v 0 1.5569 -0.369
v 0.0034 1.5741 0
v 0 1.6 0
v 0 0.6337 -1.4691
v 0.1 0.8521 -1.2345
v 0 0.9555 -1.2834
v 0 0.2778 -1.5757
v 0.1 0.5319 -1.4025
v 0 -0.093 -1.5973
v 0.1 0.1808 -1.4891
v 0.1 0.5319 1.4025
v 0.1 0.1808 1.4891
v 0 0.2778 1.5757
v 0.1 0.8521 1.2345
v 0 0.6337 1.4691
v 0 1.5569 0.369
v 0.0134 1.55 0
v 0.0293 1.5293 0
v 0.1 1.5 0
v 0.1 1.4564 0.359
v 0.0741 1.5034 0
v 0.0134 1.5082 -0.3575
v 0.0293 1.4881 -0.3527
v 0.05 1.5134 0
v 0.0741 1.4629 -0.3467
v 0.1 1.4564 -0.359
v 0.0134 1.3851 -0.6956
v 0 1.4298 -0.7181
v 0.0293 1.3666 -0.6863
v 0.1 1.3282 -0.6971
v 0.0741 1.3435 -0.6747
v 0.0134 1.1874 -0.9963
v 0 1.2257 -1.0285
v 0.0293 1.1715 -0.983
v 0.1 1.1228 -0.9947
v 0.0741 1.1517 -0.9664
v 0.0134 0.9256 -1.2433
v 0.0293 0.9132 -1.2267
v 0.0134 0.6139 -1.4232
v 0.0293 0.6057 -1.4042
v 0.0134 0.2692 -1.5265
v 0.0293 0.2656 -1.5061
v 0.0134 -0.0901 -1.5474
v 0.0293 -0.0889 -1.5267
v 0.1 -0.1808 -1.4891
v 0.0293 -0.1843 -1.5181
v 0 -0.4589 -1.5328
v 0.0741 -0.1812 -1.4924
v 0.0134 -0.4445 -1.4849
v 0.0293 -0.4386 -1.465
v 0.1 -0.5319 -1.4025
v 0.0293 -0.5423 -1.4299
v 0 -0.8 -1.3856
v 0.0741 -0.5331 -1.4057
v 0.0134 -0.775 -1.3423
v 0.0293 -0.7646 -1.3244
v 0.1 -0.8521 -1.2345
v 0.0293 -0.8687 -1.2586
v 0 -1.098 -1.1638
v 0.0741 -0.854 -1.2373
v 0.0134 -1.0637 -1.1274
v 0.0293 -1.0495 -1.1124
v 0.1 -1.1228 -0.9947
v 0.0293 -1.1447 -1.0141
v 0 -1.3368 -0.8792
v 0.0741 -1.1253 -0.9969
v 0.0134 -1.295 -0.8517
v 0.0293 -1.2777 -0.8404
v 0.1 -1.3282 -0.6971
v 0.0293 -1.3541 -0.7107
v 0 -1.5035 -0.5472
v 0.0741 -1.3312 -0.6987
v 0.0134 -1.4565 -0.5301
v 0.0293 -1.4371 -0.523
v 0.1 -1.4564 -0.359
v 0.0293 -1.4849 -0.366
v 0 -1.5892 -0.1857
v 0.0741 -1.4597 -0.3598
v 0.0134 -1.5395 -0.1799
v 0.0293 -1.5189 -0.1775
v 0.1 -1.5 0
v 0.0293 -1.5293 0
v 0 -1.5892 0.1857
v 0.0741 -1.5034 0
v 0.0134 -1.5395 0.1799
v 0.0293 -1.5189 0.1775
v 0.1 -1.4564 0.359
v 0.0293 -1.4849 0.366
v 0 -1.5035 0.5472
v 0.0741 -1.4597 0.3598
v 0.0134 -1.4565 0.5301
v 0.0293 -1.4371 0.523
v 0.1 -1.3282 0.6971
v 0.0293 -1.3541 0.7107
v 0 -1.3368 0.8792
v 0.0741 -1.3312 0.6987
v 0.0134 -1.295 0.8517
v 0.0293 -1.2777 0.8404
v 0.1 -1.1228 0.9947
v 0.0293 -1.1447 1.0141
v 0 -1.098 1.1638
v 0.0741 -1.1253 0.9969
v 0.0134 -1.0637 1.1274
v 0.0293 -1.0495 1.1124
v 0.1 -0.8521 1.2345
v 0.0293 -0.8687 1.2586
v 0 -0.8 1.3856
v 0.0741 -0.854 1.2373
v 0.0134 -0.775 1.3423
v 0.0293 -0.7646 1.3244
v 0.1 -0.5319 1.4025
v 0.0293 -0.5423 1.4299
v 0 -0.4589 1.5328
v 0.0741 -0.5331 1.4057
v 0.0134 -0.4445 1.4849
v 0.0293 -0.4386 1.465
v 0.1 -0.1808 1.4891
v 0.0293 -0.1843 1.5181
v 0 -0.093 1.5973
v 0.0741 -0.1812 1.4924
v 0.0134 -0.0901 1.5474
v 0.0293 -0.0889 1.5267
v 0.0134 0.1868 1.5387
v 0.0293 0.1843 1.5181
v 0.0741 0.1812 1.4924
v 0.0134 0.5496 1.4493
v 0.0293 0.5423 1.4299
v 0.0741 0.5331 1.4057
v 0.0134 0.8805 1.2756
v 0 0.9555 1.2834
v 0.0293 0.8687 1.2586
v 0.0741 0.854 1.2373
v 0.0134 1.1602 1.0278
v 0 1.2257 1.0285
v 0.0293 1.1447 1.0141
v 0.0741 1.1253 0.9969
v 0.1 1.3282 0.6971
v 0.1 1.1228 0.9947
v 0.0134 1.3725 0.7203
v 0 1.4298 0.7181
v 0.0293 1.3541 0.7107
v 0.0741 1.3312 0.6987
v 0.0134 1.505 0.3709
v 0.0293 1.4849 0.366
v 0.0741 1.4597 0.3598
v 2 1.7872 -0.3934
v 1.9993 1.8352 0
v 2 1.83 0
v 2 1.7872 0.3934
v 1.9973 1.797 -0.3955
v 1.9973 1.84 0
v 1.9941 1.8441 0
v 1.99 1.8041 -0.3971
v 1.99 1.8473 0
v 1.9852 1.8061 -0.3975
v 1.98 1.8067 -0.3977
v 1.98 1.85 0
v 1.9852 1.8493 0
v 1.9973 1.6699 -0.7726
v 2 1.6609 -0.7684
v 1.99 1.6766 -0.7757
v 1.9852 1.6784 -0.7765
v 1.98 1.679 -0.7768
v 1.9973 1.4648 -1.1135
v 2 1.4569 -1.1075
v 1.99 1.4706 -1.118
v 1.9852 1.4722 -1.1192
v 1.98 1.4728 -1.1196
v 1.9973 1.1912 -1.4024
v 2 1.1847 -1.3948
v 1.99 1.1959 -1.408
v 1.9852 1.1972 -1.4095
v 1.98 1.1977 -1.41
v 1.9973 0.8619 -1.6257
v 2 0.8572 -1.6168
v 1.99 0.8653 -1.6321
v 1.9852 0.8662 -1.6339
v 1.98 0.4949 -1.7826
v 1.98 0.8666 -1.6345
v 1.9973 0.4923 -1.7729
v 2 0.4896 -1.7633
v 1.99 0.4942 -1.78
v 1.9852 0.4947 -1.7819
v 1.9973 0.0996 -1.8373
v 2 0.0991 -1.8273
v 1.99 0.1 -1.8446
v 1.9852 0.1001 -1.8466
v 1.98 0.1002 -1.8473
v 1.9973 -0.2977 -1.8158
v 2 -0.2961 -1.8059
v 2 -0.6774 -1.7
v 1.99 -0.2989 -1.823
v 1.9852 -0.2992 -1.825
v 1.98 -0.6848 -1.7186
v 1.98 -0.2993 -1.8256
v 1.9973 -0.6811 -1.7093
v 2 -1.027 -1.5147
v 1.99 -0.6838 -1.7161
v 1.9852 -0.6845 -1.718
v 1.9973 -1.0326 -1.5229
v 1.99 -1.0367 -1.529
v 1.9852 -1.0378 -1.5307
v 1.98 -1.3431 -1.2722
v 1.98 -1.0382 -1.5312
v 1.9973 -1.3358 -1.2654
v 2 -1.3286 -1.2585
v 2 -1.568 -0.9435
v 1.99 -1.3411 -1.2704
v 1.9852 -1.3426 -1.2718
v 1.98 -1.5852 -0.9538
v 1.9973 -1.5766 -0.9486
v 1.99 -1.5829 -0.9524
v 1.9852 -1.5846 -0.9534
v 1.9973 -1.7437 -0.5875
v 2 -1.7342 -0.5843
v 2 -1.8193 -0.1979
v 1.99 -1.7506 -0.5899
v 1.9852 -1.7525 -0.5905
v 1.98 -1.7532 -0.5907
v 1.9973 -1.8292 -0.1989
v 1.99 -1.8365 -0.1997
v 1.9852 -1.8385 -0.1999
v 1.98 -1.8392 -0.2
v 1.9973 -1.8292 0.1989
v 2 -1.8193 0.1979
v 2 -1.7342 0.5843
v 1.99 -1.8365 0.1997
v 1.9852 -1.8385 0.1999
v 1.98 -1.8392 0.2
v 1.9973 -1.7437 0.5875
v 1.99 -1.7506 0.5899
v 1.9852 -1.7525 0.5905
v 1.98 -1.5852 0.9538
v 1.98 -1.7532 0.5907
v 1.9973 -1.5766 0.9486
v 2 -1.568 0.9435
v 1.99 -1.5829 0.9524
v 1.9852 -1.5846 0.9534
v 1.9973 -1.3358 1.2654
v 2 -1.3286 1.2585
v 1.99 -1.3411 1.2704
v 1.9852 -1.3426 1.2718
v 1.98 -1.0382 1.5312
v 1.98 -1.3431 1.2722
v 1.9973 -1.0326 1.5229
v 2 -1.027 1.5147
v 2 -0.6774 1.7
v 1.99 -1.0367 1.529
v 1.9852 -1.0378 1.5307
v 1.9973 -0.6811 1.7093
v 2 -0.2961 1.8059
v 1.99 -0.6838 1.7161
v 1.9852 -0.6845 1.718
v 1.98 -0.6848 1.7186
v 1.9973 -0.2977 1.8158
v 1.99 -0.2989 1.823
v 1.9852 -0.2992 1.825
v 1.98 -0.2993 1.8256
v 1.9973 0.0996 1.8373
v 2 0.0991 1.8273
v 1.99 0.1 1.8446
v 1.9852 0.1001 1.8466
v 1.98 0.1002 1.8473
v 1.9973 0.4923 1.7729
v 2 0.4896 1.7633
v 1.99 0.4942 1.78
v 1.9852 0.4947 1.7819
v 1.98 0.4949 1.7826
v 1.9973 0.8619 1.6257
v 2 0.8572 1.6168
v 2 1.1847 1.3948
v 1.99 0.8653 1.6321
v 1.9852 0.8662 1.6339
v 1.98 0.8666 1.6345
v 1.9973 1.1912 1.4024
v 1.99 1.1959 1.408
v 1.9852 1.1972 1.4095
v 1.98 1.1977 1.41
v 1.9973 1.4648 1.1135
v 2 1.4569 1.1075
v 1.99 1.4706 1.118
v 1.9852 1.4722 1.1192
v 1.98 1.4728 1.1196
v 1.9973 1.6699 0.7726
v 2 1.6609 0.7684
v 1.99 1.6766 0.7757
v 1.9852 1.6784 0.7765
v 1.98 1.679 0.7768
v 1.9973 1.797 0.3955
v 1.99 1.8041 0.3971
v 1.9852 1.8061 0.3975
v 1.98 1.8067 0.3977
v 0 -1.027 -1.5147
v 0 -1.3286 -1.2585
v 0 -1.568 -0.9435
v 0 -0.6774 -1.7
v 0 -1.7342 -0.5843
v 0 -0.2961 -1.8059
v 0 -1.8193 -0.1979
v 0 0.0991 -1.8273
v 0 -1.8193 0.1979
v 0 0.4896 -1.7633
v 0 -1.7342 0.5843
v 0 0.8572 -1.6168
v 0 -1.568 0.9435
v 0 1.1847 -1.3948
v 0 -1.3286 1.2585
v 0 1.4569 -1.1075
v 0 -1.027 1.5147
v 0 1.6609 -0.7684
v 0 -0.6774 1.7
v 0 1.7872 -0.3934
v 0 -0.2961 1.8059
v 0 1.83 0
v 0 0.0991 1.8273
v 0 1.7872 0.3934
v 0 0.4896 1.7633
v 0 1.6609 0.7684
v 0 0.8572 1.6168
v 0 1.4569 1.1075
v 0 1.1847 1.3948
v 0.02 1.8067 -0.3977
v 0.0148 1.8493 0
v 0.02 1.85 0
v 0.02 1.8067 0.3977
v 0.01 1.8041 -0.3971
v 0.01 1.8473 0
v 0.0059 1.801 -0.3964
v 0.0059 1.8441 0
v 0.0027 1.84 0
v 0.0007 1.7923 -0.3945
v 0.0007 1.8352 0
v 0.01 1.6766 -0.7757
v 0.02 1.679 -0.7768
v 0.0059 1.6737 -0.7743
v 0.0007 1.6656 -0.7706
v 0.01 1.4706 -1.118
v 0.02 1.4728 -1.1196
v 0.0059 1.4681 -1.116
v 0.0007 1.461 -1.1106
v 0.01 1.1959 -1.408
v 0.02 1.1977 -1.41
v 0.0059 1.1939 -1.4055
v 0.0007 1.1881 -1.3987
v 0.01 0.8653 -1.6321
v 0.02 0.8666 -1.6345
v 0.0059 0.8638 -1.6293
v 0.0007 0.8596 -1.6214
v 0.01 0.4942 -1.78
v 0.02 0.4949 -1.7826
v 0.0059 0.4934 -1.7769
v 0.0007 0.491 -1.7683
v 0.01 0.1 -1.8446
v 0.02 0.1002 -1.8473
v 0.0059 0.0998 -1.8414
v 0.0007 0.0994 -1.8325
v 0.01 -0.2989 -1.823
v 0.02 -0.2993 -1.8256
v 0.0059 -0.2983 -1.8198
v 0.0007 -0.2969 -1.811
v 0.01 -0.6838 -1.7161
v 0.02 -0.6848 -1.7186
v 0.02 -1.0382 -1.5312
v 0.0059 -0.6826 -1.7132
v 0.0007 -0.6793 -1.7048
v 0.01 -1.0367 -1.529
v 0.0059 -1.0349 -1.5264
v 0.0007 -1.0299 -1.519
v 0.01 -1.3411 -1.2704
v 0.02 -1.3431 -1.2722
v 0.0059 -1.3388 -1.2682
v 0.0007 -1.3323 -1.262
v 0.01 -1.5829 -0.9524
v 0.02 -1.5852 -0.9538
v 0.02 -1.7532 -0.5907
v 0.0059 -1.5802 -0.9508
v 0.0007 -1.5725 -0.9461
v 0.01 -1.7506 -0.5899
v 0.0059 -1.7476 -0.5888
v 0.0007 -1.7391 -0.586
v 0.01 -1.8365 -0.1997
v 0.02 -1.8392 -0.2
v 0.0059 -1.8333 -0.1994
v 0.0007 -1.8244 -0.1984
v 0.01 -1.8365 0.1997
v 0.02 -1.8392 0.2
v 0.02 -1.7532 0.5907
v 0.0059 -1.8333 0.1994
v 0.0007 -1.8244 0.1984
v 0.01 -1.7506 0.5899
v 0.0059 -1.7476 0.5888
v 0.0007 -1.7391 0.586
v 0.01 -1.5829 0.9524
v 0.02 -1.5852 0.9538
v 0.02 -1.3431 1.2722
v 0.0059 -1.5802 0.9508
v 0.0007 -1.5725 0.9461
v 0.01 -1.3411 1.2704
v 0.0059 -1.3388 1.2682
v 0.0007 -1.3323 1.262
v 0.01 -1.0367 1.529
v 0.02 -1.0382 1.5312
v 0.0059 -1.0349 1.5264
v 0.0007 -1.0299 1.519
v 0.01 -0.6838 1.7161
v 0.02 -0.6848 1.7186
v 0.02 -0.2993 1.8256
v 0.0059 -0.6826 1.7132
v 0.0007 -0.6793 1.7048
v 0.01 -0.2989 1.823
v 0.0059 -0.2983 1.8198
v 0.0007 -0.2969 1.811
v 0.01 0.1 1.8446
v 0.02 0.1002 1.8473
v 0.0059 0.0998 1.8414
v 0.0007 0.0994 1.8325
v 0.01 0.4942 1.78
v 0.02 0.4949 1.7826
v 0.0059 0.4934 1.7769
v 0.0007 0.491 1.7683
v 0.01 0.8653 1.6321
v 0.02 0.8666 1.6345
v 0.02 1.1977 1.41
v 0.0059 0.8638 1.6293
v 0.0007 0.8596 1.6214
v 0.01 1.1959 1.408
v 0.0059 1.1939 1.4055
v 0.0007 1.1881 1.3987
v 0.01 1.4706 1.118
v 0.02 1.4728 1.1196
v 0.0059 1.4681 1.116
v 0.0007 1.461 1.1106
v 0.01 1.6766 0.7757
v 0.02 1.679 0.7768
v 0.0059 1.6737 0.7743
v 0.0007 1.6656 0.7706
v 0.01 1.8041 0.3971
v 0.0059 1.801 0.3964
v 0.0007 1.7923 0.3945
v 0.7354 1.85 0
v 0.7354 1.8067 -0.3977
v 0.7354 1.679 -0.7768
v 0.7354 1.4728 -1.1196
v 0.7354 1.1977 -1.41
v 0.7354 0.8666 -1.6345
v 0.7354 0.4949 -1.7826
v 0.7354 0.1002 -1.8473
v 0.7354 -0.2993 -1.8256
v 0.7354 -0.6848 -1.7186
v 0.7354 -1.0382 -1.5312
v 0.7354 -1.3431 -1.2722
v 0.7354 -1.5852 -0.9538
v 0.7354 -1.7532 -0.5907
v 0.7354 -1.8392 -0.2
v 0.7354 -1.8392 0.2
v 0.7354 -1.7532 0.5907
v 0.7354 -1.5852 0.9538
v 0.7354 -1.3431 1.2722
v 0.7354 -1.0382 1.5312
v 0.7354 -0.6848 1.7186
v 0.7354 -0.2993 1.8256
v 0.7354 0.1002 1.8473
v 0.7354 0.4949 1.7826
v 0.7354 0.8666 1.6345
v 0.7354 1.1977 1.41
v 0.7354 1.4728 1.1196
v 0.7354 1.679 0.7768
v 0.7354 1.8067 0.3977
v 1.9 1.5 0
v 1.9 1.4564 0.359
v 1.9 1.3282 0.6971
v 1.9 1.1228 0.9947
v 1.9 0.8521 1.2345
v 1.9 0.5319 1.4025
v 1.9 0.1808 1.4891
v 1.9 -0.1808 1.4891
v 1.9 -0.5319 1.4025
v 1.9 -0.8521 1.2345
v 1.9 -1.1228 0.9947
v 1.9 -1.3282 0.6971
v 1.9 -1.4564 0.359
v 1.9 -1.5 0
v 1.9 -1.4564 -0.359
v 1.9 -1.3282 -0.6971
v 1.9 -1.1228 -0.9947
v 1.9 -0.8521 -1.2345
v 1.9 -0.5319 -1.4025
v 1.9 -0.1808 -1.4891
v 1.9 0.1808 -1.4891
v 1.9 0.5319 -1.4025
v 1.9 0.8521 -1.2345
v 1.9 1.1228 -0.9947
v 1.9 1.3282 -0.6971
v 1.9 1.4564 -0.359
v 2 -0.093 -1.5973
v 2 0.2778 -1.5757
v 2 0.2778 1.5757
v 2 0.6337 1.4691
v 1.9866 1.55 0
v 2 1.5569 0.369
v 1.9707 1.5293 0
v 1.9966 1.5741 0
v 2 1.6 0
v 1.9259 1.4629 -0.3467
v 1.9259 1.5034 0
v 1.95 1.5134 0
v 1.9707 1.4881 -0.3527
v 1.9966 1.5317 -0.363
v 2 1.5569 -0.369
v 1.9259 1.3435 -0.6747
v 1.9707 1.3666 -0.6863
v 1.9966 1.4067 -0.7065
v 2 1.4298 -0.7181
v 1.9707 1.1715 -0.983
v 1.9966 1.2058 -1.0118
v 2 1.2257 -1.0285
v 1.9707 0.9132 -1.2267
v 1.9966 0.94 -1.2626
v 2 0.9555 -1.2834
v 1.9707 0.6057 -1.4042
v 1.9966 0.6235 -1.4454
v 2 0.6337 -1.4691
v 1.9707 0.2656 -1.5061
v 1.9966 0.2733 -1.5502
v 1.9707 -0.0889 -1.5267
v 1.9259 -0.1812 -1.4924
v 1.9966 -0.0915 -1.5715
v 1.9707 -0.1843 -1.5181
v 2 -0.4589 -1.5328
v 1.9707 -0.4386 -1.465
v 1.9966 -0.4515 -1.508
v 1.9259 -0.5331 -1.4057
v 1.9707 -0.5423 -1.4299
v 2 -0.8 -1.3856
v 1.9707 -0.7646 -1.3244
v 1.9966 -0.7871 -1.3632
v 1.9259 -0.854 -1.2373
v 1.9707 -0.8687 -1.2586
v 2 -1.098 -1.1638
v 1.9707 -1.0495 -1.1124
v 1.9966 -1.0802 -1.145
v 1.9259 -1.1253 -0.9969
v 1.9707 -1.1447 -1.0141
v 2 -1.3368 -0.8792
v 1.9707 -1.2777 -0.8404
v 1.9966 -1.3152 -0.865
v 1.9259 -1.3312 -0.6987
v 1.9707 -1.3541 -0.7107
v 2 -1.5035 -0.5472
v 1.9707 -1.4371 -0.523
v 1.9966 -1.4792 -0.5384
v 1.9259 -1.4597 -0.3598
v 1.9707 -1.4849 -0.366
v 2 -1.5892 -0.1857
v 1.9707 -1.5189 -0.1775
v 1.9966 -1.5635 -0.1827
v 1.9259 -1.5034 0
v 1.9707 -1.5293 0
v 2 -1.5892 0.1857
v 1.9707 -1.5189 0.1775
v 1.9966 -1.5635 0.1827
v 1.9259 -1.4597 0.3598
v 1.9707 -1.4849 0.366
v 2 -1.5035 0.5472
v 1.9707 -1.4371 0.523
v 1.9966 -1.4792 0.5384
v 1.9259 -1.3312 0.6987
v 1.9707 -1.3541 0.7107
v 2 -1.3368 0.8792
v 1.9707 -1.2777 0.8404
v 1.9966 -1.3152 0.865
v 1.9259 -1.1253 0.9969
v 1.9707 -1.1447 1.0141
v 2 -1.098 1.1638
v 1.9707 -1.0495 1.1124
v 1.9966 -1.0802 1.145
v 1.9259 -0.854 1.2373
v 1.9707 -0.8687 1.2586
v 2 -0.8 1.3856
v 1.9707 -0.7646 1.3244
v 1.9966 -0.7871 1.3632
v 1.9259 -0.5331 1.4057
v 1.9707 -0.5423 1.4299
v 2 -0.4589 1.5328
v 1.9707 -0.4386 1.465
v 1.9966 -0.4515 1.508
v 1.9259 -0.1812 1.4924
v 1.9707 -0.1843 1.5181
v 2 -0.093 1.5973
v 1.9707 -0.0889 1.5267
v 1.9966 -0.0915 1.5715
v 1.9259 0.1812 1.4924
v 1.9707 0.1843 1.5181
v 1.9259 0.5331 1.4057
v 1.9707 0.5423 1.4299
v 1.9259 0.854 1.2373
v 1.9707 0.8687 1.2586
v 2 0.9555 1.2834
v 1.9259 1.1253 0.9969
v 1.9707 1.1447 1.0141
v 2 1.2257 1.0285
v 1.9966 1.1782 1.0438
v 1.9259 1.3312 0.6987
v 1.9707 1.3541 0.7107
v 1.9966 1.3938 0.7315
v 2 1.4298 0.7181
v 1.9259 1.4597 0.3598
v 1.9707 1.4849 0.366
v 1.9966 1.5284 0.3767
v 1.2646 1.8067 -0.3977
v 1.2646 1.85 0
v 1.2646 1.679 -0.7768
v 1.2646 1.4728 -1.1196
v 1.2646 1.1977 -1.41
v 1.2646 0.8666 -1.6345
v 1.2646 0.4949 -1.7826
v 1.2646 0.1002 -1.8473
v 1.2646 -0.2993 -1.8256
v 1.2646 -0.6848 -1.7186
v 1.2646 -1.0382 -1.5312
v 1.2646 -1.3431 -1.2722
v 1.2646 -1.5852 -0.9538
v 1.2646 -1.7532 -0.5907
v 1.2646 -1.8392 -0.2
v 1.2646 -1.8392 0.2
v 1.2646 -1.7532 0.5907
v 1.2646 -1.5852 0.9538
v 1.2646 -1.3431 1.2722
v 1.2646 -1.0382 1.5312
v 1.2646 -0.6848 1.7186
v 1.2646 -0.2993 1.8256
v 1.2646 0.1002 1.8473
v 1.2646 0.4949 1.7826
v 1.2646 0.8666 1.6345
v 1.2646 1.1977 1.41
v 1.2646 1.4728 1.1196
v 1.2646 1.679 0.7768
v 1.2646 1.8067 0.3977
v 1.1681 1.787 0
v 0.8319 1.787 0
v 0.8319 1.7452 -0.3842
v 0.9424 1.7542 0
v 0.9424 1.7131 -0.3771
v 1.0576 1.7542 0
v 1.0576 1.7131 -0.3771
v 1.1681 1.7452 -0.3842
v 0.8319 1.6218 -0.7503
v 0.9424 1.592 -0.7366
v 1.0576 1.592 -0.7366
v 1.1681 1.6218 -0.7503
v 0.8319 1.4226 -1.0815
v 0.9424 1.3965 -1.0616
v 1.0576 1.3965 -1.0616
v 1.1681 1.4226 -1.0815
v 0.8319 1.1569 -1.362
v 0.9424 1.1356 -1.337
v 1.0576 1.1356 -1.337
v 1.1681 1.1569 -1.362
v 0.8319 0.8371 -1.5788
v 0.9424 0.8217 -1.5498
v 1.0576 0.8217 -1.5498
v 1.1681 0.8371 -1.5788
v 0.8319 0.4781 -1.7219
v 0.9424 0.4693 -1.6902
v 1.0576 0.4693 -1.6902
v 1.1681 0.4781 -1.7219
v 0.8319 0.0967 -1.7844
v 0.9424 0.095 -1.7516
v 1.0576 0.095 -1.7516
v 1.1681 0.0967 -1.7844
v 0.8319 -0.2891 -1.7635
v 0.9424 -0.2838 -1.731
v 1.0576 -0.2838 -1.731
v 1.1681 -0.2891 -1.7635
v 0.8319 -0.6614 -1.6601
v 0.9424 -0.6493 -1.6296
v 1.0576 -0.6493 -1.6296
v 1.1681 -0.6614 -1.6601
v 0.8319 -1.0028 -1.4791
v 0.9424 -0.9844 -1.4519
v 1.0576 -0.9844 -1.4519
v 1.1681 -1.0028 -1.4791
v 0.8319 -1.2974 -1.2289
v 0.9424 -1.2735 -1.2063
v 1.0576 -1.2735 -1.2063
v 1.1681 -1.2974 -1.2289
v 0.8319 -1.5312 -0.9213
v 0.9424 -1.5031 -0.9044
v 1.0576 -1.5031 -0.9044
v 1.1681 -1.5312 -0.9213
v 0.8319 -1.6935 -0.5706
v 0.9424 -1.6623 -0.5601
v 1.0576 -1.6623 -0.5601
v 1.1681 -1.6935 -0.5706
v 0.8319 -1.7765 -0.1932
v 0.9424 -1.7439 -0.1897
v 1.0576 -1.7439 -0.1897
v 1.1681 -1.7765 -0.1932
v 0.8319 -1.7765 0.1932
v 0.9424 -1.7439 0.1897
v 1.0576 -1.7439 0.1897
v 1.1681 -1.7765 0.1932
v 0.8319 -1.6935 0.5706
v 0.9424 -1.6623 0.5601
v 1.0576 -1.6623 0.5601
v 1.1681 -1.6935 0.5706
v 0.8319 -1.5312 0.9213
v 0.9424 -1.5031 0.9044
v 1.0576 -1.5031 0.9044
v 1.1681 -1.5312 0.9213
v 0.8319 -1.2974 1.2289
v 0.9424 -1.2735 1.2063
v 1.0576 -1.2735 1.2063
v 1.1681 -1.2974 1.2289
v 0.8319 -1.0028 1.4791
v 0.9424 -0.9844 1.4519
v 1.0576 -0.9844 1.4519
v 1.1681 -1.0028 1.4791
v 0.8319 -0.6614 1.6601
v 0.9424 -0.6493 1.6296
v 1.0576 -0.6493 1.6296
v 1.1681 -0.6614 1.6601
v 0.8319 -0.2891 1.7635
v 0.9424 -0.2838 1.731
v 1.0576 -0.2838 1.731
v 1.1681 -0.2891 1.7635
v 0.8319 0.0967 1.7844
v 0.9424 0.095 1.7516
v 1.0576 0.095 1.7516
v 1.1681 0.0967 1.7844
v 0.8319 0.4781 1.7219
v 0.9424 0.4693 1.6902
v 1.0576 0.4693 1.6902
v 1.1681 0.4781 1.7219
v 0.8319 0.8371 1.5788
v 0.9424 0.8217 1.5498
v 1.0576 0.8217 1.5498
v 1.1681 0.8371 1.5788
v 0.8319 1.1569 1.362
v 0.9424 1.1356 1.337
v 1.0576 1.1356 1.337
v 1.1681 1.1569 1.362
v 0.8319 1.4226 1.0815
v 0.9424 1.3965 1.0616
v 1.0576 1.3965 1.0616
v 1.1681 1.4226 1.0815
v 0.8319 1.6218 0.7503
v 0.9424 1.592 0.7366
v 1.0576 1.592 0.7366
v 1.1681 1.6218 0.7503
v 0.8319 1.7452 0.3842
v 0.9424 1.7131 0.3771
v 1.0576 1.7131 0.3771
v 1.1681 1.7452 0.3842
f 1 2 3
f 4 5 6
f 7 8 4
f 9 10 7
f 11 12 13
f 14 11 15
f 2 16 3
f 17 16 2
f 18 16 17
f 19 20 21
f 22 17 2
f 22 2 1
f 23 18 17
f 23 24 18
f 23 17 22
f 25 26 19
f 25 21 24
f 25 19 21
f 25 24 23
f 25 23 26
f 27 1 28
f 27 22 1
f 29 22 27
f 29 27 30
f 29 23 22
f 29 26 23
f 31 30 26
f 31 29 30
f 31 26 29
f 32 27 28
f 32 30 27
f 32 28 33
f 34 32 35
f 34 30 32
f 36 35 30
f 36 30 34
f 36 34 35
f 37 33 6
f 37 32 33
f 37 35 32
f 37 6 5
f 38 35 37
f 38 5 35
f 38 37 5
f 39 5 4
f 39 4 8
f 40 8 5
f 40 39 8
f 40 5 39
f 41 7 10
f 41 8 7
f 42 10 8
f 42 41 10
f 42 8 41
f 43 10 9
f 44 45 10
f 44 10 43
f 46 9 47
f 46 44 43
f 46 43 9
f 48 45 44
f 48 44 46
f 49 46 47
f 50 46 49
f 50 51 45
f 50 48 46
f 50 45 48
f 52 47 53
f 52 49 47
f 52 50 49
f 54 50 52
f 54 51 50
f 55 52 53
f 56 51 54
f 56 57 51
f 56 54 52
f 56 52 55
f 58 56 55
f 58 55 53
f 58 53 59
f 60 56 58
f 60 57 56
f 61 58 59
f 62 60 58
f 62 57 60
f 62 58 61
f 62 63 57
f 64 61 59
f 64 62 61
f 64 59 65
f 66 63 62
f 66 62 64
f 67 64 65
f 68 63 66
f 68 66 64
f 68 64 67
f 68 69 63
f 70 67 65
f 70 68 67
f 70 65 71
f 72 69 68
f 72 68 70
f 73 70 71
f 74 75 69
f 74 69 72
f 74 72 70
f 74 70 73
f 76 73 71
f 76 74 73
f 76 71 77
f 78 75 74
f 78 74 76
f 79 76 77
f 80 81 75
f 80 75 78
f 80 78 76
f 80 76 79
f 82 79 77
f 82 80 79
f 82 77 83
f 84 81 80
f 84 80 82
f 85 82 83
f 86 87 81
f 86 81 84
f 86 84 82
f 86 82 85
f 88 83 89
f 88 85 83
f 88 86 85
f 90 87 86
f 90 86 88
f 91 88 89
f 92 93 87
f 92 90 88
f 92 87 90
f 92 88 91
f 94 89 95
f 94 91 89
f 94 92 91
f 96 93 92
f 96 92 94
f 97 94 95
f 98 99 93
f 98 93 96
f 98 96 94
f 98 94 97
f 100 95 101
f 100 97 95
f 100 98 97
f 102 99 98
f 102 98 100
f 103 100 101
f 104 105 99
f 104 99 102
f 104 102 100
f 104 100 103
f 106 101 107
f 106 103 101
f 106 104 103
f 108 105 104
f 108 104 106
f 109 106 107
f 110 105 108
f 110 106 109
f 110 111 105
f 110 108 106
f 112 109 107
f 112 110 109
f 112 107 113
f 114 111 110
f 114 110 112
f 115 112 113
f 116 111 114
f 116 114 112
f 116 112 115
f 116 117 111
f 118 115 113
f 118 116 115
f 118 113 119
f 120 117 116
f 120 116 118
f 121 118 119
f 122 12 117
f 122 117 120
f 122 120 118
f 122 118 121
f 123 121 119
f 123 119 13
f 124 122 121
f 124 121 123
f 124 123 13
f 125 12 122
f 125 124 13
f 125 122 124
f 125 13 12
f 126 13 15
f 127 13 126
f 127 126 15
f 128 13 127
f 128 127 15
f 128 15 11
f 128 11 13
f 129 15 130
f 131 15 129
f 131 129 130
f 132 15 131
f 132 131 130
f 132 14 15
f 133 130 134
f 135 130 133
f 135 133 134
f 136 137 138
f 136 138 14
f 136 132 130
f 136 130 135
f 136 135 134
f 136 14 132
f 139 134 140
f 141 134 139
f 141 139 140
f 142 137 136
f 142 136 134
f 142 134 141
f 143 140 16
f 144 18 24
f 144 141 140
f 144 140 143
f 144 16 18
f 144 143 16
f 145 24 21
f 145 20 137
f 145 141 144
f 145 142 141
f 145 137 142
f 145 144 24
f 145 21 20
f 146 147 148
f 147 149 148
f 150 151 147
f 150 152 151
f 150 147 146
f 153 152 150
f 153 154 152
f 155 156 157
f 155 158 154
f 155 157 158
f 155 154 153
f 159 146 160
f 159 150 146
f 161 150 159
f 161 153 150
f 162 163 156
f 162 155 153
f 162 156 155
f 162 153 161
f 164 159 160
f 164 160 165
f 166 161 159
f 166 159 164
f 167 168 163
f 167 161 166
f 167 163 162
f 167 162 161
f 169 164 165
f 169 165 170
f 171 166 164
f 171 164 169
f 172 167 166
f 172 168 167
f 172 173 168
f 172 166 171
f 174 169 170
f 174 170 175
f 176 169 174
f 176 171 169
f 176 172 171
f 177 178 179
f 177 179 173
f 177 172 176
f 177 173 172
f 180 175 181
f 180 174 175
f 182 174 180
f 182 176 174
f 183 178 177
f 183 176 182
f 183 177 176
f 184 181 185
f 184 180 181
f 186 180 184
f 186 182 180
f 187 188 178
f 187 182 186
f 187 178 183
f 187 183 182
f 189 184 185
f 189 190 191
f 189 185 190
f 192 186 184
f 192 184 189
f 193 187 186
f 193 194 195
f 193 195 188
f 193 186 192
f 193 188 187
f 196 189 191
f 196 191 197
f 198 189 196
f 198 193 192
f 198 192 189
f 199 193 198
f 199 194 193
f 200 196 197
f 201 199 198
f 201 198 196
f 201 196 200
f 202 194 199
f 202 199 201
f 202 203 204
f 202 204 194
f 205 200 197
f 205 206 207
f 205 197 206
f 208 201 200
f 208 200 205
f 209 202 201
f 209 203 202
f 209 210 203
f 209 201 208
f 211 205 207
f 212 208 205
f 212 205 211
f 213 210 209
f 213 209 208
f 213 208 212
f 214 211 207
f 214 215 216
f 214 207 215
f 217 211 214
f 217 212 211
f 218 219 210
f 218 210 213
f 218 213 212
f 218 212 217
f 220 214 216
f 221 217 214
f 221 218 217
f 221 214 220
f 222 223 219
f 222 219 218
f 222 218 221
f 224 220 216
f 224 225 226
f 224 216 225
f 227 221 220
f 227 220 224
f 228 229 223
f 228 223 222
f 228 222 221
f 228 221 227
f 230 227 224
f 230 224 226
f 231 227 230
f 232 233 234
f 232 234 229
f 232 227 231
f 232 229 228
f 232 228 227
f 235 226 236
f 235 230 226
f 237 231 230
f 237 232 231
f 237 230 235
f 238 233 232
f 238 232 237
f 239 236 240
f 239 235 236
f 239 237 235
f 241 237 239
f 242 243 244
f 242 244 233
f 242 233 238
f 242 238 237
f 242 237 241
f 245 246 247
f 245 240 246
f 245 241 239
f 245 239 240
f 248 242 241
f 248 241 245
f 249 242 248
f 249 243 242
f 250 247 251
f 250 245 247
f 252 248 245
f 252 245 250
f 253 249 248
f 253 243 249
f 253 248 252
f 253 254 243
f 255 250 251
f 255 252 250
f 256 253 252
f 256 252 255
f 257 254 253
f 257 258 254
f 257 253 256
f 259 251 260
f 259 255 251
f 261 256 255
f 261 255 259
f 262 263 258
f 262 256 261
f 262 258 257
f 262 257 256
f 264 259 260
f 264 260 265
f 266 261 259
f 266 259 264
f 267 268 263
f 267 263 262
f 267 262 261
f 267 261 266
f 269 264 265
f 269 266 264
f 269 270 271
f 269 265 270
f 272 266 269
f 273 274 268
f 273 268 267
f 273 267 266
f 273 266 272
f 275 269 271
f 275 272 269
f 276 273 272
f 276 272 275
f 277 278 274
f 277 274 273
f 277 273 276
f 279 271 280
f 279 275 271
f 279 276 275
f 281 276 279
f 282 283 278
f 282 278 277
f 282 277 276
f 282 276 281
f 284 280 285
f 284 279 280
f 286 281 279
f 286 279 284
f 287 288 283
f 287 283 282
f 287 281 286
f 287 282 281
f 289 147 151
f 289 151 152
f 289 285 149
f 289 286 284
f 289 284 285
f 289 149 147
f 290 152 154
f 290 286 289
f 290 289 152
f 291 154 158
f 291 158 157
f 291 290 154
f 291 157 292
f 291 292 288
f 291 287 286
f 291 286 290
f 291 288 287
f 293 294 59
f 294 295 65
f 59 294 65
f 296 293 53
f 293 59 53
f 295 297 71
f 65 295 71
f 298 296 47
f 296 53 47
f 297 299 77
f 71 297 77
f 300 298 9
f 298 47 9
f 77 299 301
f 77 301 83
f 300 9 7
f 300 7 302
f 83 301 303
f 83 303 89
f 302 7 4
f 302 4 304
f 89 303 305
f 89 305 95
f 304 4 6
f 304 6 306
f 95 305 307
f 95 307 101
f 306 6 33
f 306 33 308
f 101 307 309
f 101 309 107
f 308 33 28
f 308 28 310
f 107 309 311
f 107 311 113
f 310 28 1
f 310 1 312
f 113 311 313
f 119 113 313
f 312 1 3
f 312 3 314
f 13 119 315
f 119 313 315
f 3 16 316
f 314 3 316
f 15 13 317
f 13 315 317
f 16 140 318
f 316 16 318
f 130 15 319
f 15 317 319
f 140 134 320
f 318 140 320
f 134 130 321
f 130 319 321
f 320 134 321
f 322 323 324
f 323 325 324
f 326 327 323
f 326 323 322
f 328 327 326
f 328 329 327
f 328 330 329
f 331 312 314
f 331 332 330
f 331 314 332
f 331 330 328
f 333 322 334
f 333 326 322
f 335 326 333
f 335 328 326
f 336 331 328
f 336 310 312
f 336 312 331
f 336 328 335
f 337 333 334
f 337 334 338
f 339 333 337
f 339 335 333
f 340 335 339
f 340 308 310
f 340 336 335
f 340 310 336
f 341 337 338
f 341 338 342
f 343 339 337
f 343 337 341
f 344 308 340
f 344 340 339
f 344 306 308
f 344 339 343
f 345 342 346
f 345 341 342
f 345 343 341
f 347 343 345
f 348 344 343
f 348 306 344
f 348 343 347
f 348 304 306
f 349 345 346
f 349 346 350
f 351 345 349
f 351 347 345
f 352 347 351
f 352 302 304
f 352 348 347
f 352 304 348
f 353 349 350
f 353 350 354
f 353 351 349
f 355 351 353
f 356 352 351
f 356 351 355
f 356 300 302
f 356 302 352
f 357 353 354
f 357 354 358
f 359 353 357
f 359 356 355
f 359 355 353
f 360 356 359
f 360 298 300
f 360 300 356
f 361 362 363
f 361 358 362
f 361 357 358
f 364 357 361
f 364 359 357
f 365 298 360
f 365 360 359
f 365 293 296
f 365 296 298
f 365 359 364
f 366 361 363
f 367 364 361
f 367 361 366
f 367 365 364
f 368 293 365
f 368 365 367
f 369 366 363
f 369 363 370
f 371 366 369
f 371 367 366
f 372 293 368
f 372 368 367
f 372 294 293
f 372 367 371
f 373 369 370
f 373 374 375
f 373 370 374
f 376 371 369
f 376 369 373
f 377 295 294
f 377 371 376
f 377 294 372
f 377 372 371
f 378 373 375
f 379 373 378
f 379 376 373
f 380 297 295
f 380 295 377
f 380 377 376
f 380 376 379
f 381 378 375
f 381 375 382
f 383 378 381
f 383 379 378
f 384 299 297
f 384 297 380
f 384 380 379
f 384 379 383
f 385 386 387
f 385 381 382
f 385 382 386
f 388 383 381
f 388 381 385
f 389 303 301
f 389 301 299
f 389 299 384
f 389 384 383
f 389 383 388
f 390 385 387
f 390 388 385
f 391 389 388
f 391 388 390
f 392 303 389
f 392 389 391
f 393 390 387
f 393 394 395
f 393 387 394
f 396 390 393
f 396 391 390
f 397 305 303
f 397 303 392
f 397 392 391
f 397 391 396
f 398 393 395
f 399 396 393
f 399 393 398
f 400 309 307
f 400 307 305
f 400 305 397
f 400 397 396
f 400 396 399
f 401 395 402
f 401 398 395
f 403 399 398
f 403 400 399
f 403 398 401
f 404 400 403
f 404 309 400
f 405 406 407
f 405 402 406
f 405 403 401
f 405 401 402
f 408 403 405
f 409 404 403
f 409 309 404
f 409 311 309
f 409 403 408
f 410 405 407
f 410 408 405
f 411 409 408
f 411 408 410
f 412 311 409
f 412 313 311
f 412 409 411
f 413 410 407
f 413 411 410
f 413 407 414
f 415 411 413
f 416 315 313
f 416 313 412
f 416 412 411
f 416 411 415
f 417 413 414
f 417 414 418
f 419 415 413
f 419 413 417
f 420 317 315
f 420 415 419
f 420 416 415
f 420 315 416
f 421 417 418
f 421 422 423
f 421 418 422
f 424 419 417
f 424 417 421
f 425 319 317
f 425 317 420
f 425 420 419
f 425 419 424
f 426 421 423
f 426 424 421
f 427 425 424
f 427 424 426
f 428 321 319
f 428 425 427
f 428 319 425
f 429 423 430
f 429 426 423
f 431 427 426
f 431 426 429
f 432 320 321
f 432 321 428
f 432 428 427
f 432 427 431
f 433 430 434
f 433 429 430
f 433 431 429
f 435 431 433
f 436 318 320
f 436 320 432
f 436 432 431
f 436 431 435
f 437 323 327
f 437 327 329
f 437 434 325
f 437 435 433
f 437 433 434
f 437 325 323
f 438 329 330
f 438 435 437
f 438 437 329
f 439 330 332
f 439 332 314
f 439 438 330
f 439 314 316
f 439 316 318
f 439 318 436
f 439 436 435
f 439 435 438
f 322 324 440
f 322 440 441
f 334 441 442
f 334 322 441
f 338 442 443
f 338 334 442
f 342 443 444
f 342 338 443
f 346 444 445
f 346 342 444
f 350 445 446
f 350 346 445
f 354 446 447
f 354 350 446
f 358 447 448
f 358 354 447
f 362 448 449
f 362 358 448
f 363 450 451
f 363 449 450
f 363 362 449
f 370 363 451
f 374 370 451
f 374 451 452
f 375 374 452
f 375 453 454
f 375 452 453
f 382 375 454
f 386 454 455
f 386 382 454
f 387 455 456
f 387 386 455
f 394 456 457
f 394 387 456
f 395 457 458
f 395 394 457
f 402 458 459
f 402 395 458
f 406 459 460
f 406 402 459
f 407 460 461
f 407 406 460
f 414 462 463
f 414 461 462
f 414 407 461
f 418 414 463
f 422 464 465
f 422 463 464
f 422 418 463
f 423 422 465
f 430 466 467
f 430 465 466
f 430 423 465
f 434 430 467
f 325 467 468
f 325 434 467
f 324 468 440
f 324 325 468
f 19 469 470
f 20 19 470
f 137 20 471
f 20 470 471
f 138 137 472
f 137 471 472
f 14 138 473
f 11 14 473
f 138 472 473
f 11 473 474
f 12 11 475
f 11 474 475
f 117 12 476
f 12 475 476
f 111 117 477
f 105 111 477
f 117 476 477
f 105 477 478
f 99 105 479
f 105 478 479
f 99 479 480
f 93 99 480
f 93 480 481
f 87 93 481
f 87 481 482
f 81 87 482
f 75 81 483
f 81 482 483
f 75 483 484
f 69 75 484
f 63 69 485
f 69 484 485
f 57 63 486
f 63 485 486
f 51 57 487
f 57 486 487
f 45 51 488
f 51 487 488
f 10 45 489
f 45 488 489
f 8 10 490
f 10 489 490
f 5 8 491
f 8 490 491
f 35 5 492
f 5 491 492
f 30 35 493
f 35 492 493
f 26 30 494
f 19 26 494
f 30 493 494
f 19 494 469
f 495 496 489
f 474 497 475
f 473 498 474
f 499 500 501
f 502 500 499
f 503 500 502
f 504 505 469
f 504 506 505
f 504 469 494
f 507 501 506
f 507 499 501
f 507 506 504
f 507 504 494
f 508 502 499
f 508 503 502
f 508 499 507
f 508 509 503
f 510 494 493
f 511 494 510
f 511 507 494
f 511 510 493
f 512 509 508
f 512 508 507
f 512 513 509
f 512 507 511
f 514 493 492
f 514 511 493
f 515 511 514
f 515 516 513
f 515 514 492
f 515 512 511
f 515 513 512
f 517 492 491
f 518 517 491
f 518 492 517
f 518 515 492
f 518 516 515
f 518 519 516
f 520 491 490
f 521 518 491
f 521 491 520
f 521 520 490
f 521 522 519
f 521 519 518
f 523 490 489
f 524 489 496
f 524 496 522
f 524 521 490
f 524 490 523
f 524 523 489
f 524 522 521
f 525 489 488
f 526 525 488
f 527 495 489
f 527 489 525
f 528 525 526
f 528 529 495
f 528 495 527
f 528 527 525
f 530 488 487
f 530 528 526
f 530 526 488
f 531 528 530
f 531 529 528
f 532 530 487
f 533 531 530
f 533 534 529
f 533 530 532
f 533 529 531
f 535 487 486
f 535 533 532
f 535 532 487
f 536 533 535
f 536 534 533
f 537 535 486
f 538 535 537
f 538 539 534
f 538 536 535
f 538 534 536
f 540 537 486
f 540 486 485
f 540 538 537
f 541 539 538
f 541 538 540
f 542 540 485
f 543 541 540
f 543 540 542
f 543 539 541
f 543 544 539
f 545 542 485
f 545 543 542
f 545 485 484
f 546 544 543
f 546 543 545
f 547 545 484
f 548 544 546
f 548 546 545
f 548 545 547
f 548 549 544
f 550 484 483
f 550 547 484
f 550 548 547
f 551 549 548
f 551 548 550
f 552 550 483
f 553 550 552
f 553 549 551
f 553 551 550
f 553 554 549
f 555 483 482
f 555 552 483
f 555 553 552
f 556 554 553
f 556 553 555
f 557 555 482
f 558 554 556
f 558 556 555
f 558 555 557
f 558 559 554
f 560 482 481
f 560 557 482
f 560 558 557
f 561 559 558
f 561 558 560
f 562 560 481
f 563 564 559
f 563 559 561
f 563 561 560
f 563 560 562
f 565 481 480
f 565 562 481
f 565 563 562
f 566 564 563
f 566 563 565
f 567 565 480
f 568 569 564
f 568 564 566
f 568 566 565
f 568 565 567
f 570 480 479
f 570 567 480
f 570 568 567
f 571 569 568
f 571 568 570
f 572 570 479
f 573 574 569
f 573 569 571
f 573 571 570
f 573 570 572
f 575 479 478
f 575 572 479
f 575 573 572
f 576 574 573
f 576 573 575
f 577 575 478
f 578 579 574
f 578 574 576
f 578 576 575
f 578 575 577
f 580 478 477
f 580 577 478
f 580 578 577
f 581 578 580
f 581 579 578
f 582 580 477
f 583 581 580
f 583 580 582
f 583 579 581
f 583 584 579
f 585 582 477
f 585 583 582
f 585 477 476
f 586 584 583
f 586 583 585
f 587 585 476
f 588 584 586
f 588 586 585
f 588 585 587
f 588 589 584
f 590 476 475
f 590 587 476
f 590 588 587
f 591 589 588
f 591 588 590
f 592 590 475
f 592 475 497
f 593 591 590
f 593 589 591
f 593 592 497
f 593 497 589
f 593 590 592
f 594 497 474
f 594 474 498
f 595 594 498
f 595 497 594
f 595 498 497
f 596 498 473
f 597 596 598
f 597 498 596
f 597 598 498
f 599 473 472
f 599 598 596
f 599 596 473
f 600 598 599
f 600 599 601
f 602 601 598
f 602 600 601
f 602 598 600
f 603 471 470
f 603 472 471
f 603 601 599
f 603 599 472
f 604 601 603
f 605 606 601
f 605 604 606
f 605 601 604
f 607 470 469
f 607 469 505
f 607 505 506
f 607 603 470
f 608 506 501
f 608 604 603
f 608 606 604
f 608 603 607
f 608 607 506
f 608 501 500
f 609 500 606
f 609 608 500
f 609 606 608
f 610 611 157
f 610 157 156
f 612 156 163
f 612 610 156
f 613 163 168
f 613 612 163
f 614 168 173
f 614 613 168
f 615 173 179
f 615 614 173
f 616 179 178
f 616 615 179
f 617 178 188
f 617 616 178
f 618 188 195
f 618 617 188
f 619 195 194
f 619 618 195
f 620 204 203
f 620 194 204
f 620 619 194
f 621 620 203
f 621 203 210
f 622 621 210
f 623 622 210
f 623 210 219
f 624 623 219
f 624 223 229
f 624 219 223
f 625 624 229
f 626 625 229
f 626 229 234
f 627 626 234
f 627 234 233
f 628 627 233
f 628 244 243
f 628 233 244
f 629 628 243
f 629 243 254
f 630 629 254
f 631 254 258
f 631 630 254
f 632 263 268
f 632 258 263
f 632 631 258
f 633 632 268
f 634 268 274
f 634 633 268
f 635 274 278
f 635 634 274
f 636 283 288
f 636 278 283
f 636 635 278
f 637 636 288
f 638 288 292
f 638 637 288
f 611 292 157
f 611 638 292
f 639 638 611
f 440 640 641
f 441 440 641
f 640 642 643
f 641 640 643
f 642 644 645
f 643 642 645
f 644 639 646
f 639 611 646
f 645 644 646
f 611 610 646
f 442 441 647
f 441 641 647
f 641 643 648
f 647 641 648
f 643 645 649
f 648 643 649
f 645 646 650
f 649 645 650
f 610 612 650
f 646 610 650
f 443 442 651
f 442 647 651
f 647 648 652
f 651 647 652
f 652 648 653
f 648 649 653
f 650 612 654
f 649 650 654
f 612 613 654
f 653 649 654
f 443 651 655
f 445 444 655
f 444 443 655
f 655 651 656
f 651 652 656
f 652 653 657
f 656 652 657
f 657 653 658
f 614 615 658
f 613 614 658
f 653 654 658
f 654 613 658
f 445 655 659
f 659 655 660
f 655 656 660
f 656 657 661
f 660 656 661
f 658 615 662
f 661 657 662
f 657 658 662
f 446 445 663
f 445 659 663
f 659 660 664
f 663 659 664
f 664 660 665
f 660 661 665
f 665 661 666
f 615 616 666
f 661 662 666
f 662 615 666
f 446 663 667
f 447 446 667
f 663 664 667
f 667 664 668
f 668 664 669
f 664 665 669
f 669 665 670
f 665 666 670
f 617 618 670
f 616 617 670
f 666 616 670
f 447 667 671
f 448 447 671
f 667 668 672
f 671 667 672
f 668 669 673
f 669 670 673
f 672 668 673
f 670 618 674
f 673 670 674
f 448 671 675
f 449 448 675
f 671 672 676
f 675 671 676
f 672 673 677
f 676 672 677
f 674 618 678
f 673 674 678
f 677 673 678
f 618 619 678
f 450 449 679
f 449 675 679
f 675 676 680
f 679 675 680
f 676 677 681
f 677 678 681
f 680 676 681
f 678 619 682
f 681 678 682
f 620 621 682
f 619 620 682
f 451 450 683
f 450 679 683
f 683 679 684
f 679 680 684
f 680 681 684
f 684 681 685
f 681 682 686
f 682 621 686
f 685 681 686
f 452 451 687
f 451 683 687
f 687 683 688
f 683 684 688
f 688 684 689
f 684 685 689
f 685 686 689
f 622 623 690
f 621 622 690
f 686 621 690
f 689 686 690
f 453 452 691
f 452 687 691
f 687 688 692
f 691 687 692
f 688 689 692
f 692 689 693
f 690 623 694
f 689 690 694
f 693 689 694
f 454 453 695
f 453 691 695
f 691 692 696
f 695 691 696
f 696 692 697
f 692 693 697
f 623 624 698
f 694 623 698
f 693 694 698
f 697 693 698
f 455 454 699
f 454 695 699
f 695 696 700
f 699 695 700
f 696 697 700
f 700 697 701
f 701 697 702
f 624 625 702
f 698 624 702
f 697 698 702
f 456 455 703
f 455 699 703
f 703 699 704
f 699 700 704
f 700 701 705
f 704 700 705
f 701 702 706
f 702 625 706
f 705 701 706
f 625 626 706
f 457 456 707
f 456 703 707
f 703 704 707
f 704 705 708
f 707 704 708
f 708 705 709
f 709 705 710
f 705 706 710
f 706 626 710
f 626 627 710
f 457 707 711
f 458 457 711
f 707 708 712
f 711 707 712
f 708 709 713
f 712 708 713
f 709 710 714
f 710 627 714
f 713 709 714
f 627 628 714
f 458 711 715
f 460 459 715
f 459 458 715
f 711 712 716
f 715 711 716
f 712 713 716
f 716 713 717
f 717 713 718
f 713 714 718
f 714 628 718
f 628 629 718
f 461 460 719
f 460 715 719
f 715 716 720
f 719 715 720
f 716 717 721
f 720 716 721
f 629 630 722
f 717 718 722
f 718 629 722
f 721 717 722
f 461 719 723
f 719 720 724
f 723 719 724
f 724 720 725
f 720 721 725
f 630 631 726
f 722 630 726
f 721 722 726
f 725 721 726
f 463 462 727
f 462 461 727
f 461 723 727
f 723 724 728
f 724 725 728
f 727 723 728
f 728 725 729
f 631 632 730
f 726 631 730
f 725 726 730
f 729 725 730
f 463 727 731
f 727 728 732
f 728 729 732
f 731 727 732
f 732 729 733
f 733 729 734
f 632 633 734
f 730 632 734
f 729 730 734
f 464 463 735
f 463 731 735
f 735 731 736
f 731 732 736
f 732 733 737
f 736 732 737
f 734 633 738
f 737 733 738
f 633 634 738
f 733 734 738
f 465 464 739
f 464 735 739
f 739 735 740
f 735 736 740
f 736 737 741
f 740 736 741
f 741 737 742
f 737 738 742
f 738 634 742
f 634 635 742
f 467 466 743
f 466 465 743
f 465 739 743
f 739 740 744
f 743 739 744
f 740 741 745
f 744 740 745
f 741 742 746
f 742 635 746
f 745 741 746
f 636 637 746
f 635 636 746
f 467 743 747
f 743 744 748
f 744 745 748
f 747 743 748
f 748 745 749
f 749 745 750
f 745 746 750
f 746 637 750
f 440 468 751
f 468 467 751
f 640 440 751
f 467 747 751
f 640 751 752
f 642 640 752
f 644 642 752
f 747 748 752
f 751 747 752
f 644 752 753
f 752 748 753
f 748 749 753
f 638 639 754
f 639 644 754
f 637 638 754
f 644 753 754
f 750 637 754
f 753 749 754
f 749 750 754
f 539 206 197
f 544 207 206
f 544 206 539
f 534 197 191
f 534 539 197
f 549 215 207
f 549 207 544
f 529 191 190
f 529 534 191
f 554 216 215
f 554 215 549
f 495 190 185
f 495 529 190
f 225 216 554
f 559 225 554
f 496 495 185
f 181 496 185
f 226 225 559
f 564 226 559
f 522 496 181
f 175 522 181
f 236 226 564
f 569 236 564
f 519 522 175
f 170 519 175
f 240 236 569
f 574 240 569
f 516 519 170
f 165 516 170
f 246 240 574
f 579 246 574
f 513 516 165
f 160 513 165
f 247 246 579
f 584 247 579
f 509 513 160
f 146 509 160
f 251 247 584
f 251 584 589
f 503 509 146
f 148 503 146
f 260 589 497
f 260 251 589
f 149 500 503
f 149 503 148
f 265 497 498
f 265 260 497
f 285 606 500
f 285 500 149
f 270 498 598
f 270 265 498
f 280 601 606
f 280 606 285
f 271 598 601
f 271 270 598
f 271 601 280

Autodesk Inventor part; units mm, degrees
ref_plane "YZ Plane" through (0, 0, 0) normal (1, 0, 0) x (0, 1, 0)
ref_plane "XZ Plane" through (0, 0, 0) normal (0, 1, 0) x (-1, 0, 0)
ref_plane "XY Plane" through (0, 0, 0) normal (0, 0, 1) x (1, 0, 0)
sketch "Sketch_10" plane through (0, 0, 0) normal (0, 0, 1) x (1, 0, 0)
  line L0 (50, 0) -> (-50, 0)
  line L1 (0, 1.83) -> (0, 1.6)
  arc A0 (0, 1.6) -> (0.1, 1.5) centre (0.1, 1.6) ccw
  line L2 (0.1, 1.5) -> (1.9, 1.5)
  arc A1 (1.9, 1.5) -> (2, 1.6) centre (1.9, 1.6) ccw
  line L3 (2, 1.6) -> (2, 1.83)
  arc A2 (2, 1.83) -> (1.98, 1.85) centre (1.98, 1.83) ccw
  line L4 (1.98, 1.85) -> (1.2646, 1.85)
  arc A3 (0.7354, 1.85) -> (1.2646, 1.85) centre (1, 2.15) ccw
  line L5 (0.7354, 1.85) -> (0.02, 1.85)
  arc A4 (0.02, 1.85) -> (0, 1.83) centre (0.02, 1.83) ccw
revolve "Revolution1" add sketch "Sketch_10" angle 360 about axis through (50, 0, 0) along (1, 0, 0)
properties part number "W 617/3_PART1"
